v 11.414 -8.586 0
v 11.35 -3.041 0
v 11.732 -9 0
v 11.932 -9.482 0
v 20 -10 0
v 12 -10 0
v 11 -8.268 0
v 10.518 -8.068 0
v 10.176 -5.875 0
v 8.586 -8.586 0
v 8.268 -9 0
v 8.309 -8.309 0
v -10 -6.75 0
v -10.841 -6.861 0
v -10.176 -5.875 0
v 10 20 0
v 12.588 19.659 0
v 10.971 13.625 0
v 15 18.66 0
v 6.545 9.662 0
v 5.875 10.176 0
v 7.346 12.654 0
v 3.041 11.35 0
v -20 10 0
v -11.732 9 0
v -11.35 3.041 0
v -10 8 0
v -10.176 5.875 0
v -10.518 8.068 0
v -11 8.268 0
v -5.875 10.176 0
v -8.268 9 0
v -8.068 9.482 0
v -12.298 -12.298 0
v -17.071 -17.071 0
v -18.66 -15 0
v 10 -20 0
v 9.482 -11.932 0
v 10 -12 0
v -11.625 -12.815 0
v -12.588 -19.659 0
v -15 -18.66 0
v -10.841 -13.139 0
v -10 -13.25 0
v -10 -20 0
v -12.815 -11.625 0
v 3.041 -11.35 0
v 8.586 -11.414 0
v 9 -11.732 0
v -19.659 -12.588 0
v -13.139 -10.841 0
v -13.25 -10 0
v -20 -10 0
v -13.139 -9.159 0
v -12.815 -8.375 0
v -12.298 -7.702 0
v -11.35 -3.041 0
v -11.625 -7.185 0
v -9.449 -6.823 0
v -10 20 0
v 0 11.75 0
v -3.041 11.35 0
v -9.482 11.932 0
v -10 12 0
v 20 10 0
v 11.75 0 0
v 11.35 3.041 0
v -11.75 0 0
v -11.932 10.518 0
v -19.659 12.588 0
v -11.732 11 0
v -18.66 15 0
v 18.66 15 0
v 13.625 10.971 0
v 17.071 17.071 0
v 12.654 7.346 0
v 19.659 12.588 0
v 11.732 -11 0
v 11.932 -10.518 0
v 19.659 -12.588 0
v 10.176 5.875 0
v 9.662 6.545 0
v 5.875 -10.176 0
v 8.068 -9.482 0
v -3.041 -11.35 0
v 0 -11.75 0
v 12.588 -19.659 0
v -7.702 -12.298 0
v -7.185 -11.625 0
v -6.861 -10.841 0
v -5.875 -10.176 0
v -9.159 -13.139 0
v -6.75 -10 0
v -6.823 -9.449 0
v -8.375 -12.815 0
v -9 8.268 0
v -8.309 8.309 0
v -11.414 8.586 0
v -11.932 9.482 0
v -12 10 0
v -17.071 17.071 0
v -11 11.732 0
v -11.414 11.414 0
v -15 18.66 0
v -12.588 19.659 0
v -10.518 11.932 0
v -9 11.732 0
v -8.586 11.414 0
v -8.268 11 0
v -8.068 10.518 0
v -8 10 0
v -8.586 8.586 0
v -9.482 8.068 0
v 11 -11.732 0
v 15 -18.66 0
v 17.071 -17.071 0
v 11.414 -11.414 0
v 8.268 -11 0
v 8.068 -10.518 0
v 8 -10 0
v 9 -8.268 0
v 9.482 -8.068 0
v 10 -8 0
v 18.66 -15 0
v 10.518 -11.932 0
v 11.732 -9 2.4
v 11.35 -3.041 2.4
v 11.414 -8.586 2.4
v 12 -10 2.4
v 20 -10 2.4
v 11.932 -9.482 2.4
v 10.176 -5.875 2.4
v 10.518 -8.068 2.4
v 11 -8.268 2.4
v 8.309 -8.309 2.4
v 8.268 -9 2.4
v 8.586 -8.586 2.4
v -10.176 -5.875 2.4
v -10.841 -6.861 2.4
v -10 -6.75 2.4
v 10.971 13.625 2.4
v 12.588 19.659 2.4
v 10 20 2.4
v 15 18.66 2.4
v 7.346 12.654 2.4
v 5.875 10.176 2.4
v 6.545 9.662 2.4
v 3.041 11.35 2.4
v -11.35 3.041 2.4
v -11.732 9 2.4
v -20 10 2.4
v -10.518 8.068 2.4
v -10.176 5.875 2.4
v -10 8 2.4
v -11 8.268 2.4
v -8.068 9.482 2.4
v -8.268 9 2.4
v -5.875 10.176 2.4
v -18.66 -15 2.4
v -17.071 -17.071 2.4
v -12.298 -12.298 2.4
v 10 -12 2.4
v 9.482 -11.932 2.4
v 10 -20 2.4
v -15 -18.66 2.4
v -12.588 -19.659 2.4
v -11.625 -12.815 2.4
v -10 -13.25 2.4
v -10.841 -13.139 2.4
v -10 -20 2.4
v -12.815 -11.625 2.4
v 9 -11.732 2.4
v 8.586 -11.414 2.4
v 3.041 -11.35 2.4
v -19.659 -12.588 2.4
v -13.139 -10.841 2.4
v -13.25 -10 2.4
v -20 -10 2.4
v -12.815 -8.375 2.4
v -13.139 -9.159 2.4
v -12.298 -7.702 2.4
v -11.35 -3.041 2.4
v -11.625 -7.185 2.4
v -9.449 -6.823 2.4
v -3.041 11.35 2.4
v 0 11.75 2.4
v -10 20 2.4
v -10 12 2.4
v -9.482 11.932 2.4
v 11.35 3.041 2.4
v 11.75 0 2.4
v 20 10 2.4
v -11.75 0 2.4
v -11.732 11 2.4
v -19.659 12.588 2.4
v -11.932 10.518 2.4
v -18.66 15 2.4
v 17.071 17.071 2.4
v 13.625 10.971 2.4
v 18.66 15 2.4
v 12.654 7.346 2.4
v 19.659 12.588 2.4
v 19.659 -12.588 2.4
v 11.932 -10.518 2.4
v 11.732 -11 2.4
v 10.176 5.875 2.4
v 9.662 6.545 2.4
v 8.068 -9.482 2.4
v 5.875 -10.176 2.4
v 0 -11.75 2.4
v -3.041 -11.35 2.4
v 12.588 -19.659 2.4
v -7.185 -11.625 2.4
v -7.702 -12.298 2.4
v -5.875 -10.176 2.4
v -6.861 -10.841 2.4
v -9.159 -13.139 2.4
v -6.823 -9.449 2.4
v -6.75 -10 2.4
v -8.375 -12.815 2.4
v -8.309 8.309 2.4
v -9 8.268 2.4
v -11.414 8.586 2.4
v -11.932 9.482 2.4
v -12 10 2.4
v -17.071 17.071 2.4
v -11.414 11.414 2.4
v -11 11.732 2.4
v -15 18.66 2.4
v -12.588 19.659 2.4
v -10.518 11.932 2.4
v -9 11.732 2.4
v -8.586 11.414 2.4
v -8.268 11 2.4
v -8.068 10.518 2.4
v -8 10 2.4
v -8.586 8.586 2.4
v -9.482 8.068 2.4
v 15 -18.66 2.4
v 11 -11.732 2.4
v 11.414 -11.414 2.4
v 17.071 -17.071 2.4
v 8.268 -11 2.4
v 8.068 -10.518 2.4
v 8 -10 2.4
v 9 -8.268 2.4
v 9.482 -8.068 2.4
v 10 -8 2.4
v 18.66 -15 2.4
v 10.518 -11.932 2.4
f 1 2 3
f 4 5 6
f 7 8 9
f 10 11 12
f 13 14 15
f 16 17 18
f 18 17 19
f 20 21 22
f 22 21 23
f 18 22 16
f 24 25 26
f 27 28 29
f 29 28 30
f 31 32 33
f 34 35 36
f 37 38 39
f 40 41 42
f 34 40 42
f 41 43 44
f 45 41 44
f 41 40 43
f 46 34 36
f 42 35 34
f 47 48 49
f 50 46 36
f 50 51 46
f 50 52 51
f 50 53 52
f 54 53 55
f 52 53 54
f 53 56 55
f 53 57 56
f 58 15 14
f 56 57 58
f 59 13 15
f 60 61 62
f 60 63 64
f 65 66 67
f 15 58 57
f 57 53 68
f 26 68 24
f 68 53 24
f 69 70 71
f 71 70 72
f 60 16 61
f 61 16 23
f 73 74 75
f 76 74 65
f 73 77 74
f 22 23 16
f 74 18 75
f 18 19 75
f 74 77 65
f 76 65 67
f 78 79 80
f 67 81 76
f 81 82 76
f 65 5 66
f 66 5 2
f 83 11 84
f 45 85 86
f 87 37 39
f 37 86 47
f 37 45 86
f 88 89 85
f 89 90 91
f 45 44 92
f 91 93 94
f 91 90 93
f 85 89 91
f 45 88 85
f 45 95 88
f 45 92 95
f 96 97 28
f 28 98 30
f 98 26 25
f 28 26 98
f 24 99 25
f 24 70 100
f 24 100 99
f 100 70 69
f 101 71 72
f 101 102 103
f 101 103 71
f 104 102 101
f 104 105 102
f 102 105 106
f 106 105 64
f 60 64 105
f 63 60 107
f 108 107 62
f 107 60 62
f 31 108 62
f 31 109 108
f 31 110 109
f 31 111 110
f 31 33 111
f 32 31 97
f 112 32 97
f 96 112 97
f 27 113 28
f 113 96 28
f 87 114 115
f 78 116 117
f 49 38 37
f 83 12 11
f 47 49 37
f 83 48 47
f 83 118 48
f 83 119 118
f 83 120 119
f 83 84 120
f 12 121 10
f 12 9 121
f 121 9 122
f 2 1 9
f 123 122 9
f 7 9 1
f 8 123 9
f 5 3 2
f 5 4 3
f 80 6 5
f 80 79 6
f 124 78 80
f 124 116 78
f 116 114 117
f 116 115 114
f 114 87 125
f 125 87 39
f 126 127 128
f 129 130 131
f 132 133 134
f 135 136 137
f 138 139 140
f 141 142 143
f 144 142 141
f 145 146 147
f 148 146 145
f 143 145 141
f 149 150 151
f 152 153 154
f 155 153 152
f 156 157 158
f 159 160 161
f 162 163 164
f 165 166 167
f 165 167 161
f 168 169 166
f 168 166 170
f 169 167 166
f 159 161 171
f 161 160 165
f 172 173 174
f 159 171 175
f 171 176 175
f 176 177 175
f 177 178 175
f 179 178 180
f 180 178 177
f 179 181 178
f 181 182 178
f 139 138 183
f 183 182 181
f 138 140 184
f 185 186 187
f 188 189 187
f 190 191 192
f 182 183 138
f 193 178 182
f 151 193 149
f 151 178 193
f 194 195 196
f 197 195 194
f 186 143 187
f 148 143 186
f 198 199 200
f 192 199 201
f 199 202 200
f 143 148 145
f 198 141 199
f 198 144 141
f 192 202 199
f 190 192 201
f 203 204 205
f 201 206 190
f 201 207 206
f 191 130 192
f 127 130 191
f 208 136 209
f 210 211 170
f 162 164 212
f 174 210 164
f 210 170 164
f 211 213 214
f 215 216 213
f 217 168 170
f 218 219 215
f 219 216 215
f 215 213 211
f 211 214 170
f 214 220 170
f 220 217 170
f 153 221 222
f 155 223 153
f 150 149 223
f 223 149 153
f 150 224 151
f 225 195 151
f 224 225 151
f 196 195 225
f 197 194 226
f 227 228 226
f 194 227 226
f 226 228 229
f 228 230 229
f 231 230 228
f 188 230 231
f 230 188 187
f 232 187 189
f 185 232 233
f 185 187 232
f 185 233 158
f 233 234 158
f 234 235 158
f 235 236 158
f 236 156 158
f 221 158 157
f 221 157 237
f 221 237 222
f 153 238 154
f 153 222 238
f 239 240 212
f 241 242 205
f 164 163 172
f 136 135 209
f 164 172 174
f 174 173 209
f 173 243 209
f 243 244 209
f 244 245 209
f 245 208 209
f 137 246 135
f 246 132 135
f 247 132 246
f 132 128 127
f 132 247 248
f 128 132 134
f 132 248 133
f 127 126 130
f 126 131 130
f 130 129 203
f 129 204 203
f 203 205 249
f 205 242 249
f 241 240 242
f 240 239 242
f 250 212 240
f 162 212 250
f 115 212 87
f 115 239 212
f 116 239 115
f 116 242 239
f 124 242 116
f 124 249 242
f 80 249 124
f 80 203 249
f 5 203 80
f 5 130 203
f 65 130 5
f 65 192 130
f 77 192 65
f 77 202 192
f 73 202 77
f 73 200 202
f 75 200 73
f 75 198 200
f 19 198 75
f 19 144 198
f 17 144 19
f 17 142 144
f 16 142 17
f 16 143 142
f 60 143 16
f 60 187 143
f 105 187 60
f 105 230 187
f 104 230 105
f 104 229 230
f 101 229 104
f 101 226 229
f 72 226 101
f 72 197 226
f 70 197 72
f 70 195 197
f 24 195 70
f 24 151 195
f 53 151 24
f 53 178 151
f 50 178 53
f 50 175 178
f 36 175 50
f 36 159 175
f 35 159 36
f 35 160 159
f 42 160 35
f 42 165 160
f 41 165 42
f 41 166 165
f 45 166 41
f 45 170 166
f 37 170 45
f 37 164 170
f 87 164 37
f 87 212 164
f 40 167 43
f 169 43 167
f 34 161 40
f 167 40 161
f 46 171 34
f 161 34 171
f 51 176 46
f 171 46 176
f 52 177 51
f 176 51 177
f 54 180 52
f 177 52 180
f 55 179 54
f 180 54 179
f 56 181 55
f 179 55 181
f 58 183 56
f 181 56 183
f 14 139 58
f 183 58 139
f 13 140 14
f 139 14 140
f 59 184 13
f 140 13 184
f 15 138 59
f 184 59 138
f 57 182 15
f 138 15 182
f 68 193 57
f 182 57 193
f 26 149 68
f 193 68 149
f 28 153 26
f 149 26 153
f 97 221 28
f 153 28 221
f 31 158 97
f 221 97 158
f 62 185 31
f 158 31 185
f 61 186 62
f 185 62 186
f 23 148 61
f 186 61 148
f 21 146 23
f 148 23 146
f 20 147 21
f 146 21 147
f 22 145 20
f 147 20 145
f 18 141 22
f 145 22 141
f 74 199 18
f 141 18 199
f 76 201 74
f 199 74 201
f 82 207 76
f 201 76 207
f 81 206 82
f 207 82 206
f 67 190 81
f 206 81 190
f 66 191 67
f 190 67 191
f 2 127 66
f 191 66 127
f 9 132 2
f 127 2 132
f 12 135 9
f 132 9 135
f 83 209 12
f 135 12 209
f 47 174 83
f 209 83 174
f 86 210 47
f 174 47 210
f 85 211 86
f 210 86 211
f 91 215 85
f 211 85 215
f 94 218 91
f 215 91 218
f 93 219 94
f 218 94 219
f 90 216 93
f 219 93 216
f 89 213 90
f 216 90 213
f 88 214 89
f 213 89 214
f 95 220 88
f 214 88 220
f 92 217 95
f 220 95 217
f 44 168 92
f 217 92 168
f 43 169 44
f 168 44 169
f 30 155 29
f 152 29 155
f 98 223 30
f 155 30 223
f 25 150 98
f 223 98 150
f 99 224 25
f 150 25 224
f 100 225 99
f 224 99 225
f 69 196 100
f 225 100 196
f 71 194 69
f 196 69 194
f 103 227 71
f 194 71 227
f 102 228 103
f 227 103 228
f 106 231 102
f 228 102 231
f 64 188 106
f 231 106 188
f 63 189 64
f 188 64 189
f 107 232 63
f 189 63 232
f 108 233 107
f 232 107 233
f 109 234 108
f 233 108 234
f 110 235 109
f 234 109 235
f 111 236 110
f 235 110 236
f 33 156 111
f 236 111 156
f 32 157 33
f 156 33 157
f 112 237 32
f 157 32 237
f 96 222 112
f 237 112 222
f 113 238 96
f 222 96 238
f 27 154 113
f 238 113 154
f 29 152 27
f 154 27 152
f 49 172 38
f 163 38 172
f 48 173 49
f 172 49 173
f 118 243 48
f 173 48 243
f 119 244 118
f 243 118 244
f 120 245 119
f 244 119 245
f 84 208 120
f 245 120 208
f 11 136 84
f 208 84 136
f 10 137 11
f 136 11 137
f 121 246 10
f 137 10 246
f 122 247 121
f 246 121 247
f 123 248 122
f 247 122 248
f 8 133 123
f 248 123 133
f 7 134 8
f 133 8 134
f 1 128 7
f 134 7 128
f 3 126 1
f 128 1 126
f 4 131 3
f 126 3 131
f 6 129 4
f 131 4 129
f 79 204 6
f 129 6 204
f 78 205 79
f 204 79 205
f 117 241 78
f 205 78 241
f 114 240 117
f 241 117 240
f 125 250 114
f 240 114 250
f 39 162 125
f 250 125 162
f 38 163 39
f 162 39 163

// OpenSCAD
// Z-Bracket - Simple with Nut Holes

render_part=0; // Calibration_Part();
//render_part=1; // Z_Bracket_Holes_2D();
// hole_widen=0.0;
hole_widen=1.0;
// 608 Bearing Dimensions
bearing_608_od=22.5+hole_widen;
bearing_608_id=8.0;
bearing_608_h=7.0;
// ISO Metric Hardware
m3_d=3.0+hole_widen;
m3_scs_head_h=3.0;
m3_scs_head_d=5.5+hole_widen;
m3_scs_head_hex_w=2.5;
m3_nut_din934_w=5.5+hole_widen;
m3_nut_din934_h=2.4;
// MakerBot Cupcake Z-Bracket Critical Dimensions
z_bracket_w = 40.0; // Z Bracket Width
z_bracket_l = 40.0; // Z Bracket Length
z_bracket_h = 5.0+2*m3_nut_din934_h;
z_bracket_corner_r = 10.0; // Z Bracket Corner Radius
z_bracket_top_m3_x_offset=10.0; // Z Bracket M3 Bolt hole position, x offset from center
z_bracket_top_m3_y_offset=10.0; // Z Bracket M3 Bolt hole position, y offset from center

module Nut_Hole_2D(w=1.0) {
  intersection_for(i=[0:2]) {
    rotate([0,0,360*i/3]) square(size=[2*w,w],center=true);
  }
}

module Nut_Hole(w=1.0,h=1.0) {
  linear_extrude(height=h,center=false,convexity=10) {
    Nut_Hole_2D(w=w);
  }
}

module TearDrop_2D(diameter=1.0) {
  $fa=15.0;
  $fs=0.1;
  circle(r=diameter/2);
  rotate(45) square(size=diameter/2,center=false);
}

module TearDrop_Truncated_2D(diameter=1.0) {
  $fa=15.0;
  $fs=0.1;
  difference() {
    union() {
      circle(r=diameter/2);
      rotate(45) square(size=diameter/2,center=false);
    }
    translate([-diameter/2,diameter/2]) square(size=diameter);
  }
}

module Z_Bracket_Holes_2D() {
  $fa=15.0;
  $fs=0.1;
  union() {
    circle(r=bearing_608_od/2,center=true);
    translate([z_bracket_top_m3_x_offset,z_bracket_top_m3_y_offset])
      circle(r=m3_d/2,center=true);
    translate([-z_bracket_top_m3_x_offset,z_bracket_top_m3_y_offset])
      circle(r=m3_d/2,center=true);
    translate([-z_bracket_top_m3_x_offset,-z_bracket_top_m3_y_offset])
      circle(r=m3_d/2,center=true);
    translate([z_bracket_top_m3_x_offset,-z_bracket_top_m3_y_offset])
      circle(r=m3_d/2,center=true);
  }
}

module Z_Bracket_2D() {
  $fa=15.0;
  $fs=0.1;
  difference() {
   union() {
    square(size=[z_bracket_w-2*z_bracket_corner_r,z_bracket_l],center=true);
    square(size=[z_bracket_w,z_bracket_l-2*z_bracket_corner_r],center=true);
    translate([z_bracket_w/2-z_bracket_corner_r,z_bracket_w/2-z_bracket_corner_r])
      circle(r=z_bracket_corner_r,center=true);
    translate([z_bracket_w/2-z_bracket_corner_r,-(z_bracket_w/2-z_bracket_corner_r)])
      circle(r=z_bracket_corner_r,center=true);
    translate([-(z_bracket_w/2-z_bracket_corner_r),-(z_bracket_w/2-z_bracket_corner_r)])
      circle(r=z_bracket_corner_r,center=true);
    translate([-(z_bracket_w/2-z_bracket_corner_r),z_bracket_w/2-z_bracket_corner_r])
      circle(r=z_bracket_corner_r,center=true);
   }
   Z_Bracket_Holes_2D();
  }
}

module Calibration_Part() {
  $fa=15.0;
  $fs=0.1;
  linear_extrude(height=m3_nut_din934_h,convexity=10,center=false) difference() {
    Z_Bracket_2D();
    translate([z_bracket_top_m3_x_offset,z_bracket_top_m3_y_offset])
      rotate([0,0,-45]) 
	Nut_Hole_2D(w=m3_nut_din934_w);
    translate([-z_bracket_top_m3_x_offset,-z_bracket_top_m3_y_offset])
	circle(r=m3_scs_head_d/2);
  }
}

module Z_Bracket_Simple_Nut(extension=0.1) {
  $fa=15.0;
  $fs=0.1;
  difference() {
    linear_extrude(height=z_bracket_h, center=false, convexity=10)
      Z_Bracket_2D();
    translate([0,0,z_bracket_h-m3_nut_din934_h])
      cylinder(r1=bearing_608_od/2
        , r2=bearing_608_od/2+m3_nut_din934_h
        , h=2*m3_nut_din934_h
        , center=false);
    translate([z_bracket_top_m3_x_offset
        , z_bracket_top_m3_y_offset
        , z_bracket_h-m3_nut_din934_h])
      rotate([0,0,-45]) 
	Nut_Hole(w=m3_nut_din934_w,h=m3_nut_din934_h+extension);
    translate([z_bracket_top_m3_x_offset
        , -z_bracket_top_m3_y_offset
        , z_bracket_h-m3_nut_din934_h])
      rotate([0,0,-45+90]) 
	Nut_Hole(w=m3_nut_din934_w,h=m3_nut_din934_h+extension);
    translate([-z_bracket_top_m3_x_offset
        , -z_bracket_top_m3_y_offset
        , z_bracket_h-m3_nut_din934_h])
      rotate([0,0,-45+180]) 
	Nut_Hole(w=m3_nut_din934_w,h=m3_nut_din934_h+extension);
    translate([-z_bracket_top_m3_x_offset
        , z_bracket_top_m3_y_offset
        , z_bracket_h-m3_nut_din934_h])
      rotate([0,0,-45+270]) 
	Nut_Hole(w=m3_nut_din934_w,h=m3_nut_din934_h+extension);
    for(i=[0:3]) {
      translate([0,0,z_bracket_h/2]) rotate([90,0,360*i/4]) {
        linear_extrude(height=bearing_608_od/2+m3_nut_din934_h+0.1, center=false, convexity=10)
          Nut_Hole_2D(w=m3_nut_din934_w);
        linear_extrude(height=z_bracket_w,center=false, convexity=10)
          circle(r=m3_d/2+0.1);
        translate([0,0,z_bracket_w/2-m3_scs_head_h])
          linear_extrude(height=m3_scs_head_h+0.1,center=false,convexity=10)
            TearDrop_Truncated_2D(diameter=m3_scs_head_d);
      }
    }
  }
}

if(render_part==0) {
  echo("Rendering Calibration_Part()...");
  Calibration_Part();
}

if(render_part==1) {
  echo("Rendering Z_Bracket_Simple_Nut()...");
  Z_Bracket_Simple_Nut();
}
